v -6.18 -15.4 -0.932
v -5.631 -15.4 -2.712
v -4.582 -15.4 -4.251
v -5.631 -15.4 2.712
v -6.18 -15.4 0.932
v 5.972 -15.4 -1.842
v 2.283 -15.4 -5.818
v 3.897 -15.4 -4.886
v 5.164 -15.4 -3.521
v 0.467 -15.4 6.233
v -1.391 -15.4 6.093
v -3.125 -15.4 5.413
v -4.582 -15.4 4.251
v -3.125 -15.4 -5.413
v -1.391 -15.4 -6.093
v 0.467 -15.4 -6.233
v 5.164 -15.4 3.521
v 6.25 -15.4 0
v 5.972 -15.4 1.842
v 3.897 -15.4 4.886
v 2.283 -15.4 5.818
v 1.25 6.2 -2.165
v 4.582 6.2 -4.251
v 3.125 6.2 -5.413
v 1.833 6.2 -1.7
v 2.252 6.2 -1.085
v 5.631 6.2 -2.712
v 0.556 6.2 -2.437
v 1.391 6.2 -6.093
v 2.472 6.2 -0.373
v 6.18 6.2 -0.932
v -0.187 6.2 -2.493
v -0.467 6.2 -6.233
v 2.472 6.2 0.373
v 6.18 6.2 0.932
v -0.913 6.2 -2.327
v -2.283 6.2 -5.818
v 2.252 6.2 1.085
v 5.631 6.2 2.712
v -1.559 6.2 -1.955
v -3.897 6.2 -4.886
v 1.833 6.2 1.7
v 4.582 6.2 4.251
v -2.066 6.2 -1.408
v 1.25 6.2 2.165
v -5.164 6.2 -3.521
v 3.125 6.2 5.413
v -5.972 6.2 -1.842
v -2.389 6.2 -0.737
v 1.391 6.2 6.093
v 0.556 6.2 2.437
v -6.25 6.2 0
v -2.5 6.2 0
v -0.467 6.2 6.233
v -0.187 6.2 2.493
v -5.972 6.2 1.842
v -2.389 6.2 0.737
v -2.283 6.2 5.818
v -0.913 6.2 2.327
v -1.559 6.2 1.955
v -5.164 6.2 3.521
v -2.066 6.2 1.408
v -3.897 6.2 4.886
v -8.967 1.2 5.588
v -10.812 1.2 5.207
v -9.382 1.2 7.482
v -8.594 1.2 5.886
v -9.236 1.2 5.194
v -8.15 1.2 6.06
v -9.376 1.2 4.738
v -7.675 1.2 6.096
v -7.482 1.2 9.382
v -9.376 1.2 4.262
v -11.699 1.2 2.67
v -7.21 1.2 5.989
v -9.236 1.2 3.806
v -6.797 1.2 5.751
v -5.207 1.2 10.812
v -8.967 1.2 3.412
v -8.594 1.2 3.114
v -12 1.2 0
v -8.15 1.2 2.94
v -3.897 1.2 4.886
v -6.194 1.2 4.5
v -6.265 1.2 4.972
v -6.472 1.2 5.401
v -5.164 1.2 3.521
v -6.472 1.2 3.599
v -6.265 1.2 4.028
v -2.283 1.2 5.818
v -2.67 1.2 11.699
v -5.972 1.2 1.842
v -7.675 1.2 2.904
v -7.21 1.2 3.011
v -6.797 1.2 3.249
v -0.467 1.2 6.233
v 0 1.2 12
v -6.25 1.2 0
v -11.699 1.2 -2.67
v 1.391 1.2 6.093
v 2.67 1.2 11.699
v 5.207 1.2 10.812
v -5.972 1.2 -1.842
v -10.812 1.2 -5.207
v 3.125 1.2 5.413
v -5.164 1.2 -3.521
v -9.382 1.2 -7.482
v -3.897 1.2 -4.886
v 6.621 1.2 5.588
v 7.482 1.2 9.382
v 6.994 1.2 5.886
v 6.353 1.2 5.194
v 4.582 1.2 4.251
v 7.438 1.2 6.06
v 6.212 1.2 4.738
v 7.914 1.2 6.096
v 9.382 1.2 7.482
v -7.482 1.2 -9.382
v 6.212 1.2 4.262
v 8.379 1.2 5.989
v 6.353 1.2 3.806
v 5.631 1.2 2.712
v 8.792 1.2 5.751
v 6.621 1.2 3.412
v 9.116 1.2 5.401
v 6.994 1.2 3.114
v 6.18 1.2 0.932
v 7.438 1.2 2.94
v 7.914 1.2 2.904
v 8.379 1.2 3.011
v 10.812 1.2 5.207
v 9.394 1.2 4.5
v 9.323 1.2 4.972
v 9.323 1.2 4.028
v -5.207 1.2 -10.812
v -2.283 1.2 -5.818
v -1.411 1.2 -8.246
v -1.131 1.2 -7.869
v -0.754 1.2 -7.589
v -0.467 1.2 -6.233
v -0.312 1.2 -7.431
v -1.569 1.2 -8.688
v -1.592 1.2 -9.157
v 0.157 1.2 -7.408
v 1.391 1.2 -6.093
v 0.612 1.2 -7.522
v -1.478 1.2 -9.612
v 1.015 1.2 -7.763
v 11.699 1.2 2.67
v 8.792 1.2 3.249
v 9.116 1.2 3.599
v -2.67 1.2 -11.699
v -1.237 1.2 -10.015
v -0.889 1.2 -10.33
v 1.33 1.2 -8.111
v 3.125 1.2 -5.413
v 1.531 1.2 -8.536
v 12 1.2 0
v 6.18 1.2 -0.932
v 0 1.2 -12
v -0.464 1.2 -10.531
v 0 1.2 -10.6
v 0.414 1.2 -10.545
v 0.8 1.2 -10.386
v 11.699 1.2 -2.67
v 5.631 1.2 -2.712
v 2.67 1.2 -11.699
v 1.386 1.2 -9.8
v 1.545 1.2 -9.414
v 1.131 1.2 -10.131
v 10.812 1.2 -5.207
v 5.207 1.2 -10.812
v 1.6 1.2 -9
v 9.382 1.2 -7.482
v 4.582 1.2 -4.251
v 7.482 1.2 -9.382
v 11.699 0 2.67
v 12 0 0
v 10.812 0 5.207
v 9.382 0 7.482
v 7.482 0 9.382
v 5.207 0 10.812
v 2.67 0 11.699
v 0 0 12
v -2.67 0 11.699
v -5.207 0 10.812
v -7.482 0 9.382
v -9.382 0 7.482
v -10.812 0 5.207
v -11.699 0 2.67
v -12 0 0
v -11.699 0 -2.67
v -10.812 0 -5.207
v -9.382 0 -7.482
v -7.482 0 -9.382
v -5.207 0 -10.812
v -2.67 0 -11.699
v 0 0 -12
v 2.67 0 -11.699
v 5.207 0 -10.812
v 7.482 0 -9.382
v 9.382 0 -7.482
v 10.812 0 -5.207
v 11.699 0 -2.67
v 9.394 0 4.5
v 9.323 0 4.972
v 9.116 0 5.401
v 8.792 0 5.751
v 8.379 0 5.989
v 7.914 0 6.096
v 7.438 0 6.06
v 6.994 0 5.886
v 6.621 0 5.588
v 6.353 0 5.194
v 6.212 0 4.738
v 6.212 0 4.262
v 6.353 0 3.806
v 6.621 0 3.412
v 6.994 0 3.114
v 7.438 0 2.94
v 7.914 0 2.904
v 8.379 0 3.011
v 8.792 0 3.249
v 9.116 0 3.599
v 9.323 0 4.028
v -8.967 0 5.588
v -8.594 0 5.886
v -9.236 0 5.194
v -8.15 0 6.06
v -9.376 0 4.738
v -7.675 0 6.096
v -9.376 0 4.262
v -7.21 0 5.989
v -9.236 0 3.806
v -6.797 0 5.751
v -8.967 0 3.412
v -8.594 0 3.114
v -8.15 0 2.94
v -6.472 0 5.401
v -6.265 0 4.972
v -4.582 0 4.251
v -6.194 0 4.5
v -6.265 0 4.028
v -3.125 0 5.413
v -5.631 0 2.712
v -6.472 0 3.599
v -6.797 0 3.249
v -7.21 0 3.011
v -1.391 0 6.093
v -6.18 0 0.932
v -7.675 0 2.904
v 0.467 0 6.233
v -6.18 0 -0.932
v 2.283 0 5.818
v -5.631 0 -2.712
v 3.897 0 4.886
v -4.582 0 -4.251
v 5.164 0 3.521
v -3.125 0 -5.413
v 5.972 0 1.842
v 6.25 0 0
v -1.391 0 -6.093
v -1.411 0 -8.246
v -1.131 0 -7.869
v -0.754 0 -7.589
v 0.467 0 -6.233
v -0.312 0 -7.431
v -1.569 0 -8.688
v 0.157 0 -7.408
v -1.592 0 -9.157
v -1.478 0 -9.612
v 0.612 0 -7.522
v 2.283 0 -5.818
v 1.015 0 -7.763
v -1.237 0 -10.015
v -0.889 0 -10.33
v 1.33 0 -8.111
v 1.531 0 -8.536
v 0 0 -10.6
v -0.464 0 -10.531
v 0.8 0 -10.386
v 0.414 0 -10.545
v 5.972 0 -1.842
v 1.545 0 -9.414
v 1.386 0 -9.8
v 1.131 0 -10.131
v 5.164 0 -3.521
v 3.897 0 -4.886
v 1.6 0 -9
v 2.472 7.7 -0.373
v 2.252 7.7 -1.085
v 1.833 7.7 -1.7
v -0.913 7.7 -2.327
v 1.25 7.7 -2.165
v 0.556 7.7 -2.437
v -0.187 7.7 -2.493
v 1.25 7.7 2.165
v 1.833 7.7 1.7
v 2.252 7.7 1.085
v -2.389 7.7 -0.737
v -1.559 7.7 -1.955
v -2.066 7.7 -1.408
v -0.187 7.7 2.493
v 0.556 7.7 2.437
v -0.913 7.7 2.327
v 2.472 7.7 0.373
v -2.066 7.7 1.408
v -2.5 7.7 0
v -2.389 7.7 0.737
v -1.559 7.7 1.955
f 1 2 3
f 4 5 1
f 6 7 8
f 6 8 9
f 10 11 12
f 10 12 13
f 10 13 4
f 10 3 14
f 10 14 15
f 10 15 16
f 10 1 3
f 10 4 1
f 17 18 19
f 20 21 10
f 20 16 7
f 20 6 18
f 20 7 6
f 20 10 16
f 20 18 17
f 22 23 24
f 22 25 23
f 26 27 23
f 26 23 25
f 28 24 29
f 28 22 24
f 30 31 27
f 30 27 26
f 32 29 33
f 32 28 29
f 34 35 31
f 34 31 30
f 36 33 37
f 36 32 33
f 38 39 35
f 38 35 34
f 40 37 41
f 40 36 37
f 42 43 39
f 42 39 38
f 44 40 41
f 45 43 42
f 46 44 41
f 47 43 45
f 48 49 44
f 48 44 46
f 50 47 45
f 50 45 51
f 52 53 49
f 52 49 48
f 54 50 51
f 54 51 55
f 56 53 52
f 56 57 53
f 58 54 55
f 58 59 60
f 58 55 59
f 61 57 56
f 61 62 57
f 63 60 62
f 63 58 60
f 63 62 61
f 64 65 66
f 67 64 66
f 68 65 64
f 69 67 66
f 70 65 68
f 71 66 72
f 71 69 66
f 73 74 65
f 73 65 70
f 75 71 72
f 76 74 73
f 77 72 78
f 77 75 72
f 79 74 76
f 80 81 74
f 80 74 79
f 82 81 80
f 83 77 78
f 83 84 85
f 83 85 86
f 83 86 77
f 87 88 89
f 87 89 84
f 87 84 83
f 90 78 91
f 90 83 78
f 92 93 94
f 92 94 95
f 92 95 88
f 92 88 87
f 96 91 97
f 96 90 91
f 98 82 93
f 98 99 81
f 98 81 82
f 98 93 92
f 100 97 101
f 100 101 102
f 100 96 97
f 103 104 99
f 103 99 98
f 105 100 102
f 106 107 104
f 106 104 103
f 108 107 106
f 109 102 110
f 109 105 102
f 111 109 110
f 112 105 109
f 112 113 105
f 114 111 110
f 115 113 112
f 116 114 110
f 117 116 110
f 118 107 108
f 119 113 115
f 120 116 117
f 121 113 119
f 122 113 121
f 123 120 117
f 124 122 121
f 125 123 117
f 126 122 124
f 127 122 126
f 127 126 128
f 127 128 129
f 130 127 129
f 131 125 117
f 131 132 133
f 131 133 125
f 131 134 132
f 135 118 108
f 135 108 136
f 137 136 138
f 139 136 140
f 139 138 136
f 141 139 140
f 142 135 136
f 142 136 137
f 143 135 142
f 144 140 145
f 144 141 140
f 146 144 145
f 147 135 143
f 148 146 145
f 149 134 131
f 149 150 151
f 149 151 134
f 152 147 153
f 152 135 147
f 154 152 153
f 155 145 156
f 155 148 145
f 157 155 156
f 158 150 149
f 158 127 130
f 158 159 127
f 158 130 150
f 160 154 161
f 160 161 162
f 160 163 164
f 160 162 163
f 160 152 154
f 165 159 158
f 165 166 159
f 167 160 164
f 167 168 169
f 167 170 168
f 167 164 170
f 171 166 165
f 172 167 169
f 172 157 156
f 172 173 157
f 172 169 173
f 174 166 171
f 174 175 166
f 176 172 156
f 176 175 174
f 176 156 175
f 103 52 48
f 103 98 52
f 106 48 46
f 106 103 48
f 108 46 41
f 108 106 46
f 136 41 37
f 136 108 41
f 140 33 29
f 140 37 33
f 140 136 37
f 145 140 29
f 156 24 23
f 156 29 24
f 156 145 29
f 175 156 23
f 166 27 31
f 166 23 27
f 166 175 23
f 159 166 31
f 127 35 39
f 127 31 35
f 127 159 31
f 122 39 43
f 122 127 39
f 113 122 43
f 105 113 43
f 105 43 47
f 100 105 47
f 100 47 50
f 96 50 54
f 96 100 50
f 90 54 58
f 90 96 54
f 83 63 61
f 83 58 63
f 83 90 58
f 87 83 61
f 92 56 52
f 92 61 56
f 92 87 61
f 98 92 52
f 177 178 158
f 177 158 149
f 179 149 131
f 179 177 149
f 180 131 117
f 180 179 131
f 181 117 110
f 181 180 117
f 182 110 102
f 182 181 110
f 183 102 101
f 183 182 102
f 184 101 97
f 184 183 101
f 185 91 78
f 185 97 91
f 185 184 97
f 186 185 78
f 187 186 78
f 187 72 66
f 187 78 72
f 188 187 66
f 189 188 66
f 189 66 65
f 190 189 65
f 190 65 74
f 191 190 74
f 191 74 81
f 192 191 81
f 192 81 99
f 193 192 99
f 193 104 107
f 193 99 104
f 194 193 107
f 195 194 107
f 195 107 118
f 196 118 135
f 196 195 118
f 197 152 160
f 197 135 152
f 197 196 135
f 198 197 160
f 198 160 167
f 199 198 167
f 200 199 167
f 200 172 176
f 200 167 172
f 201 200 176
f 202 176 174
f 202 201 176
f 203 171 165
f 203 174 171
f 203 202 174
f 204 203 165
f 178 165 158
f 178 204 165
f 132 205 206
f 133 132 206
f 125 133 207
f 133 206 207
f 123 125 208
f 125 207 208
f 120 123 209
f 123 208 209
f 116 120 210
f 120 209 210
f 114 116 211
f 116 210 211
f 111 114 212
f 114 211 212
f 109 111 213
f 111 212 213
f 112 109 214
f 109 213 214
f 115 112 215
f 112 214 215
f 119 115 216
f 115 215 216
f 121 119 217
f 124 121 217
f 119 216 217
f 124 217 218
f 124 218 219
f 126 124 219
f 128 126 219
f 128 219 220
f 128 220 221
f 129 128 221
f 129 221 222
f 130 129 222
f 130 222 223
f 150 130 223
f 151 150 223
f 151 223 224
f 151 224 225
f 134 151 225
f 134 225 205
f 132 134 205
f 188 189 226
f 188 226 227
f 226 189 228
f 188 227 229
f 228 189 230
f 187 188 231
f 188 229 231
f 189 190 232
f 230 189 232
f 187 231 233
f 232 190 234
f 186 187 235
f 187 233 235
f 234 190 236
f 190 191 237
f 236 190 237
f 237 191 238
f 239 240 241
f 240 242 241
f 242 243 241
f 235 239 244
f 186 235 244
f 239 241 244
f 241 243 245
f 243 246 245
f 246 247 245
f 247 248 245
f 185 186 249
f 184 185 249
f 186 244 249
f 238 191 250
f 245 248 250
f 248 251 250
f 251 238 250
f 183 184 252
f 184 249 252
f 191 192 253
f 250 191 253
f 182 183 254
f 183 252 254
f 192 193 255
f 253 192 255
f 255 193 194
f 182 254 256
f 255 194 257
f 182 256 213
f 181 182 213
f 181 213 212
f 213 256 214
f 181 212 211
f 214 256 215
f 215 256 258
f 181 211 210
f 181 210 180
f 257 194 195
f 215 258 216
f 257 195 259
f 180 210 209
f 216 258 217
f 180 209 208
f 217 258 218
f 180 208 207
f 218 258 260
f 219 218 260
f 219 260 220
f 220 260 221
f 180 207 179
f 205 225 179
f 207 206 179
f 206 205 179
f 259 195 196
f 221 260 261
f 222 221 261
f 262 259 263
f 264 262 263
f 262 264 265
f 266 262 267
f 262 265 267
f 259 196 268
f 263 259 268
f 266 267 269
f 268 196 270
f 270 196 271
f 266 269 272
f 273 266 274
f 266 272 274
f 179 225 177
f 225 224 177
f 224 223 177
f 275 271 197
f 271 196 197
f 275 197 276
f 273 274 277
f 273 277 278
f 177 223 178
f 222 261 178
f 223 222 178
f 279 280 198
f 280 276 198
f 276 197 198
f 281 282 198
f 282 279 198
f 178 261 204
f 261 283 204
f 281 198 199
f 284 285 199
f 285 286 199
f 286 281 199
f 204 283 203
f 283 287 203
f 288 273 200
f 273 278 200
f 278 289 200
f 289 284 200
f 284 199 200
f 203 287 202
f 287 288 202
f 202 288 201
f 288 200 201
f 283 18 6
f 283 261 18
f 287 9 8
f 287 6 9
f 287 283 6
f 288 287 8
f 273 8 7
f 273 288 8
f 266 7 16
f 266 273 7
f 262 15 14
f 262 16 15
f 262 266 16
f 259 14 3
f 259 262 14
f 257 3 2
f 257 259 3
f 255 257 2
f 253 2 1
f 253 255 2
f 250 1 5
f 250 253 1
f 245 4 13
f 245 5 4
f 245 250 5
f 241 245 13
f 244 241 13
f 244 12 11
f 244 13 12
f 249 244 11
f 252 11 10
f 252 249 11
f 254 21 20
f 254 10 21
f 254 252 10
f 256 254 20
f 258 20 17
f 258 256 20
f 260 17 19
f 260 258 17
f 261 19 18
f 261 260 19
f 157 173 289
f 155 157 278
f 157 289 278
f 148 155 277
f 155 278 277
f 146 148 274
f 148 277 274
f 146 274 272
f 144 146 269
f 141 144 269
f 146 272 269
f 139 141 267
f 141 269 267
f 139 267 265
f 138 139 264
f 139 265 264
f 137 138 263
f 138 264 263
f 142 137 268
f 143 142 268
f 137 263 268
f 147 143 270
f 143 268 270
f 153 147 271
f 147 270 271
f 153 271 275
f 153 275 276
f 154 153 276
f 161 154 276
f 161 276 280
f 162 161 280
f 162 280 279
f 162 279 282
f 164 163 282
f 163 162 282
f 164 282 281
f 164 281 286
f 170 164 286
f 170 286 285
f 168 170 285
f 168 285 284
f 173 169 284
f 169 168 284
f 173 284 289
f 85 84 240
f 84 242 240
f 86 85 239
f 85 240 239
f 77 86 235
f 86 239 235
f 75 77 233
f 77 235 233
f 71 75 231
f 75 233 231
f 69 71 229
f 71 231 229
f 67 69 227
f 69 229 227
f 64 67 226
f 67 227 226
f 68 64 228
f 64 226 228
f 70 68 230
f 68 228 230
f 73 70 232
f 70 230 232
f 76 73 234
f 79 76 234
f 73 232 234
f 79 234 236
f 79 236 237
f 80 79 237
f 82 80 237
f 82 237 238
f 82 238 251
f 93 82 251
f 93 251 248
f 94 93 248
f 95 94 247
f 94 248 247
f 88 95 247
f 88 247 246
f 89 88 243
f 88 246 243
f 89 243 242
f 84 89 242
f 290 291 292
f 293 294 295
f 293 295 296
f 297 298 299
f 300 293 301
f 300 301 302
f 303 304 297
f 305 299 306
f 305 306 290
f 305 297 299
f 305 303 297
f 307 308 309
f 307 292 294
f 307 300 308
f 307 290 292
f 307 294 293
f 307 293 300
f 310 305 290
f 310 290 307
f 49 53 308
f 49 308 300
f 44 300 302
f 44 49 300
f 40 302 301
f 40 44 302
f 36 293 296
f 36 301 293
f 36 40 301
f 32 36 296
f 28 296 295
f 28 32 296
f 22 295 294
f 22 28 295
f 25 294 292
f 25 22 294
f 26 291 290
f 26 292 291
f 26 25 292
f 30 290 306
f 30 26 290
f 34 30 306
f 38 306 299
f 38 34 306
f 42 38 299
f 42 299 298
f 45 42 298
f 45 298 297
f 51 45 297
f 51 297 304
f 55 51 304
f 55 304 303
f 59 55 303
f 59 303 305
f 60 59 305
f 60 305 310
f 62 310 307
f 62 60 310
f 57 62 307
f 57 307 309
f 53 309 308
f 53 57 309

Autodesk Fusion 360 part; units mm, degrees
sketch "Esquisse1" plane through (0, 0, 0) normal (0, 1, 0) x (1, 0, 0)
  circle A0 centre (0, 0) radius 12
  line L0 (0, 0) -> (0, 12)
  circle A1 centre (0, 0) radius 9
  circle A2 centre (0, 9) radius 1.6
  circle A3 centre (-7.7942, -4.5) radius 1.6
  circle A4 centre (7.7942, -4.5) radius 1.6
  dimension "d1" = 24
  dimension "d2" = 18
  dimension "d3" = 3.2
  dimension "d5" = 360
extrude "Extrusion1" add sketch "Esquisse1" along normal blind 1.2 contours A0 | A1 A2 A3 A4 makes body 1
sketch "Esquisse2" plane through (0, 1.2, 0) normal (0, 1, 0) x (-1, 0, 0)
  circle A0 centre (-7.7942, 4.5) radius 1.6
  circle A1 centre (0, -9) radius 1.6
  circle A2 centre (7.7942, 4.5) radius 1.6
  circle A3 centre (0, 0) radius 12
  circle A4 centre (0, 0) radius 6.25
  dimension "d8" = 12.5
extrude "Extrusion2" add sketch "Esquisse2" along normal blind 5 contours A4 bodies 1
sketch "Esquisse3" plane through (0, 0, 0) normal (0, -1, 0) x (1, 0, 0)
  circle A0 centre (7.7942, 4.5) radius 1.6
  circle A1 centre (0, -9) radius 1.6
  circle A2 centre (-7.7942, 4.5) radius 1.6
  circle A3 centre (0, 0) radius 12
  circle A4 centre (0, 0) radius 6.25
  dimension "d11" = 12.5
extrude "Extrusion3" add sketch "Esquisse3" along normal blind 15.4 contours A4 bodies 1
sketch "Esquisse4" plane through (0, 6.2, 0) normal (0, 1, 0) x (-1, 0, 0)
  circle A0 centre (0, 0) radius 6.25
  circle A1 centre (0, 0) radius 2.5
  dimension "d14" = 5
extrude "Extrusion4" add sketch "Esquisse4" along normal blind 1.5 contours A1 bodies 1
copy_body "Corps->Comp1" bodies 1 removing the originals makes body 2 in component "anneau coulissant rotatif"
component "anneau coulissant rotatif" placed x (1, 0, 0) y (0, 1, 0) z (0, 0, 1) at (0, 0, 0)
equation "d12 = 21.6 mm - 5 mm - 1.2 mm"
